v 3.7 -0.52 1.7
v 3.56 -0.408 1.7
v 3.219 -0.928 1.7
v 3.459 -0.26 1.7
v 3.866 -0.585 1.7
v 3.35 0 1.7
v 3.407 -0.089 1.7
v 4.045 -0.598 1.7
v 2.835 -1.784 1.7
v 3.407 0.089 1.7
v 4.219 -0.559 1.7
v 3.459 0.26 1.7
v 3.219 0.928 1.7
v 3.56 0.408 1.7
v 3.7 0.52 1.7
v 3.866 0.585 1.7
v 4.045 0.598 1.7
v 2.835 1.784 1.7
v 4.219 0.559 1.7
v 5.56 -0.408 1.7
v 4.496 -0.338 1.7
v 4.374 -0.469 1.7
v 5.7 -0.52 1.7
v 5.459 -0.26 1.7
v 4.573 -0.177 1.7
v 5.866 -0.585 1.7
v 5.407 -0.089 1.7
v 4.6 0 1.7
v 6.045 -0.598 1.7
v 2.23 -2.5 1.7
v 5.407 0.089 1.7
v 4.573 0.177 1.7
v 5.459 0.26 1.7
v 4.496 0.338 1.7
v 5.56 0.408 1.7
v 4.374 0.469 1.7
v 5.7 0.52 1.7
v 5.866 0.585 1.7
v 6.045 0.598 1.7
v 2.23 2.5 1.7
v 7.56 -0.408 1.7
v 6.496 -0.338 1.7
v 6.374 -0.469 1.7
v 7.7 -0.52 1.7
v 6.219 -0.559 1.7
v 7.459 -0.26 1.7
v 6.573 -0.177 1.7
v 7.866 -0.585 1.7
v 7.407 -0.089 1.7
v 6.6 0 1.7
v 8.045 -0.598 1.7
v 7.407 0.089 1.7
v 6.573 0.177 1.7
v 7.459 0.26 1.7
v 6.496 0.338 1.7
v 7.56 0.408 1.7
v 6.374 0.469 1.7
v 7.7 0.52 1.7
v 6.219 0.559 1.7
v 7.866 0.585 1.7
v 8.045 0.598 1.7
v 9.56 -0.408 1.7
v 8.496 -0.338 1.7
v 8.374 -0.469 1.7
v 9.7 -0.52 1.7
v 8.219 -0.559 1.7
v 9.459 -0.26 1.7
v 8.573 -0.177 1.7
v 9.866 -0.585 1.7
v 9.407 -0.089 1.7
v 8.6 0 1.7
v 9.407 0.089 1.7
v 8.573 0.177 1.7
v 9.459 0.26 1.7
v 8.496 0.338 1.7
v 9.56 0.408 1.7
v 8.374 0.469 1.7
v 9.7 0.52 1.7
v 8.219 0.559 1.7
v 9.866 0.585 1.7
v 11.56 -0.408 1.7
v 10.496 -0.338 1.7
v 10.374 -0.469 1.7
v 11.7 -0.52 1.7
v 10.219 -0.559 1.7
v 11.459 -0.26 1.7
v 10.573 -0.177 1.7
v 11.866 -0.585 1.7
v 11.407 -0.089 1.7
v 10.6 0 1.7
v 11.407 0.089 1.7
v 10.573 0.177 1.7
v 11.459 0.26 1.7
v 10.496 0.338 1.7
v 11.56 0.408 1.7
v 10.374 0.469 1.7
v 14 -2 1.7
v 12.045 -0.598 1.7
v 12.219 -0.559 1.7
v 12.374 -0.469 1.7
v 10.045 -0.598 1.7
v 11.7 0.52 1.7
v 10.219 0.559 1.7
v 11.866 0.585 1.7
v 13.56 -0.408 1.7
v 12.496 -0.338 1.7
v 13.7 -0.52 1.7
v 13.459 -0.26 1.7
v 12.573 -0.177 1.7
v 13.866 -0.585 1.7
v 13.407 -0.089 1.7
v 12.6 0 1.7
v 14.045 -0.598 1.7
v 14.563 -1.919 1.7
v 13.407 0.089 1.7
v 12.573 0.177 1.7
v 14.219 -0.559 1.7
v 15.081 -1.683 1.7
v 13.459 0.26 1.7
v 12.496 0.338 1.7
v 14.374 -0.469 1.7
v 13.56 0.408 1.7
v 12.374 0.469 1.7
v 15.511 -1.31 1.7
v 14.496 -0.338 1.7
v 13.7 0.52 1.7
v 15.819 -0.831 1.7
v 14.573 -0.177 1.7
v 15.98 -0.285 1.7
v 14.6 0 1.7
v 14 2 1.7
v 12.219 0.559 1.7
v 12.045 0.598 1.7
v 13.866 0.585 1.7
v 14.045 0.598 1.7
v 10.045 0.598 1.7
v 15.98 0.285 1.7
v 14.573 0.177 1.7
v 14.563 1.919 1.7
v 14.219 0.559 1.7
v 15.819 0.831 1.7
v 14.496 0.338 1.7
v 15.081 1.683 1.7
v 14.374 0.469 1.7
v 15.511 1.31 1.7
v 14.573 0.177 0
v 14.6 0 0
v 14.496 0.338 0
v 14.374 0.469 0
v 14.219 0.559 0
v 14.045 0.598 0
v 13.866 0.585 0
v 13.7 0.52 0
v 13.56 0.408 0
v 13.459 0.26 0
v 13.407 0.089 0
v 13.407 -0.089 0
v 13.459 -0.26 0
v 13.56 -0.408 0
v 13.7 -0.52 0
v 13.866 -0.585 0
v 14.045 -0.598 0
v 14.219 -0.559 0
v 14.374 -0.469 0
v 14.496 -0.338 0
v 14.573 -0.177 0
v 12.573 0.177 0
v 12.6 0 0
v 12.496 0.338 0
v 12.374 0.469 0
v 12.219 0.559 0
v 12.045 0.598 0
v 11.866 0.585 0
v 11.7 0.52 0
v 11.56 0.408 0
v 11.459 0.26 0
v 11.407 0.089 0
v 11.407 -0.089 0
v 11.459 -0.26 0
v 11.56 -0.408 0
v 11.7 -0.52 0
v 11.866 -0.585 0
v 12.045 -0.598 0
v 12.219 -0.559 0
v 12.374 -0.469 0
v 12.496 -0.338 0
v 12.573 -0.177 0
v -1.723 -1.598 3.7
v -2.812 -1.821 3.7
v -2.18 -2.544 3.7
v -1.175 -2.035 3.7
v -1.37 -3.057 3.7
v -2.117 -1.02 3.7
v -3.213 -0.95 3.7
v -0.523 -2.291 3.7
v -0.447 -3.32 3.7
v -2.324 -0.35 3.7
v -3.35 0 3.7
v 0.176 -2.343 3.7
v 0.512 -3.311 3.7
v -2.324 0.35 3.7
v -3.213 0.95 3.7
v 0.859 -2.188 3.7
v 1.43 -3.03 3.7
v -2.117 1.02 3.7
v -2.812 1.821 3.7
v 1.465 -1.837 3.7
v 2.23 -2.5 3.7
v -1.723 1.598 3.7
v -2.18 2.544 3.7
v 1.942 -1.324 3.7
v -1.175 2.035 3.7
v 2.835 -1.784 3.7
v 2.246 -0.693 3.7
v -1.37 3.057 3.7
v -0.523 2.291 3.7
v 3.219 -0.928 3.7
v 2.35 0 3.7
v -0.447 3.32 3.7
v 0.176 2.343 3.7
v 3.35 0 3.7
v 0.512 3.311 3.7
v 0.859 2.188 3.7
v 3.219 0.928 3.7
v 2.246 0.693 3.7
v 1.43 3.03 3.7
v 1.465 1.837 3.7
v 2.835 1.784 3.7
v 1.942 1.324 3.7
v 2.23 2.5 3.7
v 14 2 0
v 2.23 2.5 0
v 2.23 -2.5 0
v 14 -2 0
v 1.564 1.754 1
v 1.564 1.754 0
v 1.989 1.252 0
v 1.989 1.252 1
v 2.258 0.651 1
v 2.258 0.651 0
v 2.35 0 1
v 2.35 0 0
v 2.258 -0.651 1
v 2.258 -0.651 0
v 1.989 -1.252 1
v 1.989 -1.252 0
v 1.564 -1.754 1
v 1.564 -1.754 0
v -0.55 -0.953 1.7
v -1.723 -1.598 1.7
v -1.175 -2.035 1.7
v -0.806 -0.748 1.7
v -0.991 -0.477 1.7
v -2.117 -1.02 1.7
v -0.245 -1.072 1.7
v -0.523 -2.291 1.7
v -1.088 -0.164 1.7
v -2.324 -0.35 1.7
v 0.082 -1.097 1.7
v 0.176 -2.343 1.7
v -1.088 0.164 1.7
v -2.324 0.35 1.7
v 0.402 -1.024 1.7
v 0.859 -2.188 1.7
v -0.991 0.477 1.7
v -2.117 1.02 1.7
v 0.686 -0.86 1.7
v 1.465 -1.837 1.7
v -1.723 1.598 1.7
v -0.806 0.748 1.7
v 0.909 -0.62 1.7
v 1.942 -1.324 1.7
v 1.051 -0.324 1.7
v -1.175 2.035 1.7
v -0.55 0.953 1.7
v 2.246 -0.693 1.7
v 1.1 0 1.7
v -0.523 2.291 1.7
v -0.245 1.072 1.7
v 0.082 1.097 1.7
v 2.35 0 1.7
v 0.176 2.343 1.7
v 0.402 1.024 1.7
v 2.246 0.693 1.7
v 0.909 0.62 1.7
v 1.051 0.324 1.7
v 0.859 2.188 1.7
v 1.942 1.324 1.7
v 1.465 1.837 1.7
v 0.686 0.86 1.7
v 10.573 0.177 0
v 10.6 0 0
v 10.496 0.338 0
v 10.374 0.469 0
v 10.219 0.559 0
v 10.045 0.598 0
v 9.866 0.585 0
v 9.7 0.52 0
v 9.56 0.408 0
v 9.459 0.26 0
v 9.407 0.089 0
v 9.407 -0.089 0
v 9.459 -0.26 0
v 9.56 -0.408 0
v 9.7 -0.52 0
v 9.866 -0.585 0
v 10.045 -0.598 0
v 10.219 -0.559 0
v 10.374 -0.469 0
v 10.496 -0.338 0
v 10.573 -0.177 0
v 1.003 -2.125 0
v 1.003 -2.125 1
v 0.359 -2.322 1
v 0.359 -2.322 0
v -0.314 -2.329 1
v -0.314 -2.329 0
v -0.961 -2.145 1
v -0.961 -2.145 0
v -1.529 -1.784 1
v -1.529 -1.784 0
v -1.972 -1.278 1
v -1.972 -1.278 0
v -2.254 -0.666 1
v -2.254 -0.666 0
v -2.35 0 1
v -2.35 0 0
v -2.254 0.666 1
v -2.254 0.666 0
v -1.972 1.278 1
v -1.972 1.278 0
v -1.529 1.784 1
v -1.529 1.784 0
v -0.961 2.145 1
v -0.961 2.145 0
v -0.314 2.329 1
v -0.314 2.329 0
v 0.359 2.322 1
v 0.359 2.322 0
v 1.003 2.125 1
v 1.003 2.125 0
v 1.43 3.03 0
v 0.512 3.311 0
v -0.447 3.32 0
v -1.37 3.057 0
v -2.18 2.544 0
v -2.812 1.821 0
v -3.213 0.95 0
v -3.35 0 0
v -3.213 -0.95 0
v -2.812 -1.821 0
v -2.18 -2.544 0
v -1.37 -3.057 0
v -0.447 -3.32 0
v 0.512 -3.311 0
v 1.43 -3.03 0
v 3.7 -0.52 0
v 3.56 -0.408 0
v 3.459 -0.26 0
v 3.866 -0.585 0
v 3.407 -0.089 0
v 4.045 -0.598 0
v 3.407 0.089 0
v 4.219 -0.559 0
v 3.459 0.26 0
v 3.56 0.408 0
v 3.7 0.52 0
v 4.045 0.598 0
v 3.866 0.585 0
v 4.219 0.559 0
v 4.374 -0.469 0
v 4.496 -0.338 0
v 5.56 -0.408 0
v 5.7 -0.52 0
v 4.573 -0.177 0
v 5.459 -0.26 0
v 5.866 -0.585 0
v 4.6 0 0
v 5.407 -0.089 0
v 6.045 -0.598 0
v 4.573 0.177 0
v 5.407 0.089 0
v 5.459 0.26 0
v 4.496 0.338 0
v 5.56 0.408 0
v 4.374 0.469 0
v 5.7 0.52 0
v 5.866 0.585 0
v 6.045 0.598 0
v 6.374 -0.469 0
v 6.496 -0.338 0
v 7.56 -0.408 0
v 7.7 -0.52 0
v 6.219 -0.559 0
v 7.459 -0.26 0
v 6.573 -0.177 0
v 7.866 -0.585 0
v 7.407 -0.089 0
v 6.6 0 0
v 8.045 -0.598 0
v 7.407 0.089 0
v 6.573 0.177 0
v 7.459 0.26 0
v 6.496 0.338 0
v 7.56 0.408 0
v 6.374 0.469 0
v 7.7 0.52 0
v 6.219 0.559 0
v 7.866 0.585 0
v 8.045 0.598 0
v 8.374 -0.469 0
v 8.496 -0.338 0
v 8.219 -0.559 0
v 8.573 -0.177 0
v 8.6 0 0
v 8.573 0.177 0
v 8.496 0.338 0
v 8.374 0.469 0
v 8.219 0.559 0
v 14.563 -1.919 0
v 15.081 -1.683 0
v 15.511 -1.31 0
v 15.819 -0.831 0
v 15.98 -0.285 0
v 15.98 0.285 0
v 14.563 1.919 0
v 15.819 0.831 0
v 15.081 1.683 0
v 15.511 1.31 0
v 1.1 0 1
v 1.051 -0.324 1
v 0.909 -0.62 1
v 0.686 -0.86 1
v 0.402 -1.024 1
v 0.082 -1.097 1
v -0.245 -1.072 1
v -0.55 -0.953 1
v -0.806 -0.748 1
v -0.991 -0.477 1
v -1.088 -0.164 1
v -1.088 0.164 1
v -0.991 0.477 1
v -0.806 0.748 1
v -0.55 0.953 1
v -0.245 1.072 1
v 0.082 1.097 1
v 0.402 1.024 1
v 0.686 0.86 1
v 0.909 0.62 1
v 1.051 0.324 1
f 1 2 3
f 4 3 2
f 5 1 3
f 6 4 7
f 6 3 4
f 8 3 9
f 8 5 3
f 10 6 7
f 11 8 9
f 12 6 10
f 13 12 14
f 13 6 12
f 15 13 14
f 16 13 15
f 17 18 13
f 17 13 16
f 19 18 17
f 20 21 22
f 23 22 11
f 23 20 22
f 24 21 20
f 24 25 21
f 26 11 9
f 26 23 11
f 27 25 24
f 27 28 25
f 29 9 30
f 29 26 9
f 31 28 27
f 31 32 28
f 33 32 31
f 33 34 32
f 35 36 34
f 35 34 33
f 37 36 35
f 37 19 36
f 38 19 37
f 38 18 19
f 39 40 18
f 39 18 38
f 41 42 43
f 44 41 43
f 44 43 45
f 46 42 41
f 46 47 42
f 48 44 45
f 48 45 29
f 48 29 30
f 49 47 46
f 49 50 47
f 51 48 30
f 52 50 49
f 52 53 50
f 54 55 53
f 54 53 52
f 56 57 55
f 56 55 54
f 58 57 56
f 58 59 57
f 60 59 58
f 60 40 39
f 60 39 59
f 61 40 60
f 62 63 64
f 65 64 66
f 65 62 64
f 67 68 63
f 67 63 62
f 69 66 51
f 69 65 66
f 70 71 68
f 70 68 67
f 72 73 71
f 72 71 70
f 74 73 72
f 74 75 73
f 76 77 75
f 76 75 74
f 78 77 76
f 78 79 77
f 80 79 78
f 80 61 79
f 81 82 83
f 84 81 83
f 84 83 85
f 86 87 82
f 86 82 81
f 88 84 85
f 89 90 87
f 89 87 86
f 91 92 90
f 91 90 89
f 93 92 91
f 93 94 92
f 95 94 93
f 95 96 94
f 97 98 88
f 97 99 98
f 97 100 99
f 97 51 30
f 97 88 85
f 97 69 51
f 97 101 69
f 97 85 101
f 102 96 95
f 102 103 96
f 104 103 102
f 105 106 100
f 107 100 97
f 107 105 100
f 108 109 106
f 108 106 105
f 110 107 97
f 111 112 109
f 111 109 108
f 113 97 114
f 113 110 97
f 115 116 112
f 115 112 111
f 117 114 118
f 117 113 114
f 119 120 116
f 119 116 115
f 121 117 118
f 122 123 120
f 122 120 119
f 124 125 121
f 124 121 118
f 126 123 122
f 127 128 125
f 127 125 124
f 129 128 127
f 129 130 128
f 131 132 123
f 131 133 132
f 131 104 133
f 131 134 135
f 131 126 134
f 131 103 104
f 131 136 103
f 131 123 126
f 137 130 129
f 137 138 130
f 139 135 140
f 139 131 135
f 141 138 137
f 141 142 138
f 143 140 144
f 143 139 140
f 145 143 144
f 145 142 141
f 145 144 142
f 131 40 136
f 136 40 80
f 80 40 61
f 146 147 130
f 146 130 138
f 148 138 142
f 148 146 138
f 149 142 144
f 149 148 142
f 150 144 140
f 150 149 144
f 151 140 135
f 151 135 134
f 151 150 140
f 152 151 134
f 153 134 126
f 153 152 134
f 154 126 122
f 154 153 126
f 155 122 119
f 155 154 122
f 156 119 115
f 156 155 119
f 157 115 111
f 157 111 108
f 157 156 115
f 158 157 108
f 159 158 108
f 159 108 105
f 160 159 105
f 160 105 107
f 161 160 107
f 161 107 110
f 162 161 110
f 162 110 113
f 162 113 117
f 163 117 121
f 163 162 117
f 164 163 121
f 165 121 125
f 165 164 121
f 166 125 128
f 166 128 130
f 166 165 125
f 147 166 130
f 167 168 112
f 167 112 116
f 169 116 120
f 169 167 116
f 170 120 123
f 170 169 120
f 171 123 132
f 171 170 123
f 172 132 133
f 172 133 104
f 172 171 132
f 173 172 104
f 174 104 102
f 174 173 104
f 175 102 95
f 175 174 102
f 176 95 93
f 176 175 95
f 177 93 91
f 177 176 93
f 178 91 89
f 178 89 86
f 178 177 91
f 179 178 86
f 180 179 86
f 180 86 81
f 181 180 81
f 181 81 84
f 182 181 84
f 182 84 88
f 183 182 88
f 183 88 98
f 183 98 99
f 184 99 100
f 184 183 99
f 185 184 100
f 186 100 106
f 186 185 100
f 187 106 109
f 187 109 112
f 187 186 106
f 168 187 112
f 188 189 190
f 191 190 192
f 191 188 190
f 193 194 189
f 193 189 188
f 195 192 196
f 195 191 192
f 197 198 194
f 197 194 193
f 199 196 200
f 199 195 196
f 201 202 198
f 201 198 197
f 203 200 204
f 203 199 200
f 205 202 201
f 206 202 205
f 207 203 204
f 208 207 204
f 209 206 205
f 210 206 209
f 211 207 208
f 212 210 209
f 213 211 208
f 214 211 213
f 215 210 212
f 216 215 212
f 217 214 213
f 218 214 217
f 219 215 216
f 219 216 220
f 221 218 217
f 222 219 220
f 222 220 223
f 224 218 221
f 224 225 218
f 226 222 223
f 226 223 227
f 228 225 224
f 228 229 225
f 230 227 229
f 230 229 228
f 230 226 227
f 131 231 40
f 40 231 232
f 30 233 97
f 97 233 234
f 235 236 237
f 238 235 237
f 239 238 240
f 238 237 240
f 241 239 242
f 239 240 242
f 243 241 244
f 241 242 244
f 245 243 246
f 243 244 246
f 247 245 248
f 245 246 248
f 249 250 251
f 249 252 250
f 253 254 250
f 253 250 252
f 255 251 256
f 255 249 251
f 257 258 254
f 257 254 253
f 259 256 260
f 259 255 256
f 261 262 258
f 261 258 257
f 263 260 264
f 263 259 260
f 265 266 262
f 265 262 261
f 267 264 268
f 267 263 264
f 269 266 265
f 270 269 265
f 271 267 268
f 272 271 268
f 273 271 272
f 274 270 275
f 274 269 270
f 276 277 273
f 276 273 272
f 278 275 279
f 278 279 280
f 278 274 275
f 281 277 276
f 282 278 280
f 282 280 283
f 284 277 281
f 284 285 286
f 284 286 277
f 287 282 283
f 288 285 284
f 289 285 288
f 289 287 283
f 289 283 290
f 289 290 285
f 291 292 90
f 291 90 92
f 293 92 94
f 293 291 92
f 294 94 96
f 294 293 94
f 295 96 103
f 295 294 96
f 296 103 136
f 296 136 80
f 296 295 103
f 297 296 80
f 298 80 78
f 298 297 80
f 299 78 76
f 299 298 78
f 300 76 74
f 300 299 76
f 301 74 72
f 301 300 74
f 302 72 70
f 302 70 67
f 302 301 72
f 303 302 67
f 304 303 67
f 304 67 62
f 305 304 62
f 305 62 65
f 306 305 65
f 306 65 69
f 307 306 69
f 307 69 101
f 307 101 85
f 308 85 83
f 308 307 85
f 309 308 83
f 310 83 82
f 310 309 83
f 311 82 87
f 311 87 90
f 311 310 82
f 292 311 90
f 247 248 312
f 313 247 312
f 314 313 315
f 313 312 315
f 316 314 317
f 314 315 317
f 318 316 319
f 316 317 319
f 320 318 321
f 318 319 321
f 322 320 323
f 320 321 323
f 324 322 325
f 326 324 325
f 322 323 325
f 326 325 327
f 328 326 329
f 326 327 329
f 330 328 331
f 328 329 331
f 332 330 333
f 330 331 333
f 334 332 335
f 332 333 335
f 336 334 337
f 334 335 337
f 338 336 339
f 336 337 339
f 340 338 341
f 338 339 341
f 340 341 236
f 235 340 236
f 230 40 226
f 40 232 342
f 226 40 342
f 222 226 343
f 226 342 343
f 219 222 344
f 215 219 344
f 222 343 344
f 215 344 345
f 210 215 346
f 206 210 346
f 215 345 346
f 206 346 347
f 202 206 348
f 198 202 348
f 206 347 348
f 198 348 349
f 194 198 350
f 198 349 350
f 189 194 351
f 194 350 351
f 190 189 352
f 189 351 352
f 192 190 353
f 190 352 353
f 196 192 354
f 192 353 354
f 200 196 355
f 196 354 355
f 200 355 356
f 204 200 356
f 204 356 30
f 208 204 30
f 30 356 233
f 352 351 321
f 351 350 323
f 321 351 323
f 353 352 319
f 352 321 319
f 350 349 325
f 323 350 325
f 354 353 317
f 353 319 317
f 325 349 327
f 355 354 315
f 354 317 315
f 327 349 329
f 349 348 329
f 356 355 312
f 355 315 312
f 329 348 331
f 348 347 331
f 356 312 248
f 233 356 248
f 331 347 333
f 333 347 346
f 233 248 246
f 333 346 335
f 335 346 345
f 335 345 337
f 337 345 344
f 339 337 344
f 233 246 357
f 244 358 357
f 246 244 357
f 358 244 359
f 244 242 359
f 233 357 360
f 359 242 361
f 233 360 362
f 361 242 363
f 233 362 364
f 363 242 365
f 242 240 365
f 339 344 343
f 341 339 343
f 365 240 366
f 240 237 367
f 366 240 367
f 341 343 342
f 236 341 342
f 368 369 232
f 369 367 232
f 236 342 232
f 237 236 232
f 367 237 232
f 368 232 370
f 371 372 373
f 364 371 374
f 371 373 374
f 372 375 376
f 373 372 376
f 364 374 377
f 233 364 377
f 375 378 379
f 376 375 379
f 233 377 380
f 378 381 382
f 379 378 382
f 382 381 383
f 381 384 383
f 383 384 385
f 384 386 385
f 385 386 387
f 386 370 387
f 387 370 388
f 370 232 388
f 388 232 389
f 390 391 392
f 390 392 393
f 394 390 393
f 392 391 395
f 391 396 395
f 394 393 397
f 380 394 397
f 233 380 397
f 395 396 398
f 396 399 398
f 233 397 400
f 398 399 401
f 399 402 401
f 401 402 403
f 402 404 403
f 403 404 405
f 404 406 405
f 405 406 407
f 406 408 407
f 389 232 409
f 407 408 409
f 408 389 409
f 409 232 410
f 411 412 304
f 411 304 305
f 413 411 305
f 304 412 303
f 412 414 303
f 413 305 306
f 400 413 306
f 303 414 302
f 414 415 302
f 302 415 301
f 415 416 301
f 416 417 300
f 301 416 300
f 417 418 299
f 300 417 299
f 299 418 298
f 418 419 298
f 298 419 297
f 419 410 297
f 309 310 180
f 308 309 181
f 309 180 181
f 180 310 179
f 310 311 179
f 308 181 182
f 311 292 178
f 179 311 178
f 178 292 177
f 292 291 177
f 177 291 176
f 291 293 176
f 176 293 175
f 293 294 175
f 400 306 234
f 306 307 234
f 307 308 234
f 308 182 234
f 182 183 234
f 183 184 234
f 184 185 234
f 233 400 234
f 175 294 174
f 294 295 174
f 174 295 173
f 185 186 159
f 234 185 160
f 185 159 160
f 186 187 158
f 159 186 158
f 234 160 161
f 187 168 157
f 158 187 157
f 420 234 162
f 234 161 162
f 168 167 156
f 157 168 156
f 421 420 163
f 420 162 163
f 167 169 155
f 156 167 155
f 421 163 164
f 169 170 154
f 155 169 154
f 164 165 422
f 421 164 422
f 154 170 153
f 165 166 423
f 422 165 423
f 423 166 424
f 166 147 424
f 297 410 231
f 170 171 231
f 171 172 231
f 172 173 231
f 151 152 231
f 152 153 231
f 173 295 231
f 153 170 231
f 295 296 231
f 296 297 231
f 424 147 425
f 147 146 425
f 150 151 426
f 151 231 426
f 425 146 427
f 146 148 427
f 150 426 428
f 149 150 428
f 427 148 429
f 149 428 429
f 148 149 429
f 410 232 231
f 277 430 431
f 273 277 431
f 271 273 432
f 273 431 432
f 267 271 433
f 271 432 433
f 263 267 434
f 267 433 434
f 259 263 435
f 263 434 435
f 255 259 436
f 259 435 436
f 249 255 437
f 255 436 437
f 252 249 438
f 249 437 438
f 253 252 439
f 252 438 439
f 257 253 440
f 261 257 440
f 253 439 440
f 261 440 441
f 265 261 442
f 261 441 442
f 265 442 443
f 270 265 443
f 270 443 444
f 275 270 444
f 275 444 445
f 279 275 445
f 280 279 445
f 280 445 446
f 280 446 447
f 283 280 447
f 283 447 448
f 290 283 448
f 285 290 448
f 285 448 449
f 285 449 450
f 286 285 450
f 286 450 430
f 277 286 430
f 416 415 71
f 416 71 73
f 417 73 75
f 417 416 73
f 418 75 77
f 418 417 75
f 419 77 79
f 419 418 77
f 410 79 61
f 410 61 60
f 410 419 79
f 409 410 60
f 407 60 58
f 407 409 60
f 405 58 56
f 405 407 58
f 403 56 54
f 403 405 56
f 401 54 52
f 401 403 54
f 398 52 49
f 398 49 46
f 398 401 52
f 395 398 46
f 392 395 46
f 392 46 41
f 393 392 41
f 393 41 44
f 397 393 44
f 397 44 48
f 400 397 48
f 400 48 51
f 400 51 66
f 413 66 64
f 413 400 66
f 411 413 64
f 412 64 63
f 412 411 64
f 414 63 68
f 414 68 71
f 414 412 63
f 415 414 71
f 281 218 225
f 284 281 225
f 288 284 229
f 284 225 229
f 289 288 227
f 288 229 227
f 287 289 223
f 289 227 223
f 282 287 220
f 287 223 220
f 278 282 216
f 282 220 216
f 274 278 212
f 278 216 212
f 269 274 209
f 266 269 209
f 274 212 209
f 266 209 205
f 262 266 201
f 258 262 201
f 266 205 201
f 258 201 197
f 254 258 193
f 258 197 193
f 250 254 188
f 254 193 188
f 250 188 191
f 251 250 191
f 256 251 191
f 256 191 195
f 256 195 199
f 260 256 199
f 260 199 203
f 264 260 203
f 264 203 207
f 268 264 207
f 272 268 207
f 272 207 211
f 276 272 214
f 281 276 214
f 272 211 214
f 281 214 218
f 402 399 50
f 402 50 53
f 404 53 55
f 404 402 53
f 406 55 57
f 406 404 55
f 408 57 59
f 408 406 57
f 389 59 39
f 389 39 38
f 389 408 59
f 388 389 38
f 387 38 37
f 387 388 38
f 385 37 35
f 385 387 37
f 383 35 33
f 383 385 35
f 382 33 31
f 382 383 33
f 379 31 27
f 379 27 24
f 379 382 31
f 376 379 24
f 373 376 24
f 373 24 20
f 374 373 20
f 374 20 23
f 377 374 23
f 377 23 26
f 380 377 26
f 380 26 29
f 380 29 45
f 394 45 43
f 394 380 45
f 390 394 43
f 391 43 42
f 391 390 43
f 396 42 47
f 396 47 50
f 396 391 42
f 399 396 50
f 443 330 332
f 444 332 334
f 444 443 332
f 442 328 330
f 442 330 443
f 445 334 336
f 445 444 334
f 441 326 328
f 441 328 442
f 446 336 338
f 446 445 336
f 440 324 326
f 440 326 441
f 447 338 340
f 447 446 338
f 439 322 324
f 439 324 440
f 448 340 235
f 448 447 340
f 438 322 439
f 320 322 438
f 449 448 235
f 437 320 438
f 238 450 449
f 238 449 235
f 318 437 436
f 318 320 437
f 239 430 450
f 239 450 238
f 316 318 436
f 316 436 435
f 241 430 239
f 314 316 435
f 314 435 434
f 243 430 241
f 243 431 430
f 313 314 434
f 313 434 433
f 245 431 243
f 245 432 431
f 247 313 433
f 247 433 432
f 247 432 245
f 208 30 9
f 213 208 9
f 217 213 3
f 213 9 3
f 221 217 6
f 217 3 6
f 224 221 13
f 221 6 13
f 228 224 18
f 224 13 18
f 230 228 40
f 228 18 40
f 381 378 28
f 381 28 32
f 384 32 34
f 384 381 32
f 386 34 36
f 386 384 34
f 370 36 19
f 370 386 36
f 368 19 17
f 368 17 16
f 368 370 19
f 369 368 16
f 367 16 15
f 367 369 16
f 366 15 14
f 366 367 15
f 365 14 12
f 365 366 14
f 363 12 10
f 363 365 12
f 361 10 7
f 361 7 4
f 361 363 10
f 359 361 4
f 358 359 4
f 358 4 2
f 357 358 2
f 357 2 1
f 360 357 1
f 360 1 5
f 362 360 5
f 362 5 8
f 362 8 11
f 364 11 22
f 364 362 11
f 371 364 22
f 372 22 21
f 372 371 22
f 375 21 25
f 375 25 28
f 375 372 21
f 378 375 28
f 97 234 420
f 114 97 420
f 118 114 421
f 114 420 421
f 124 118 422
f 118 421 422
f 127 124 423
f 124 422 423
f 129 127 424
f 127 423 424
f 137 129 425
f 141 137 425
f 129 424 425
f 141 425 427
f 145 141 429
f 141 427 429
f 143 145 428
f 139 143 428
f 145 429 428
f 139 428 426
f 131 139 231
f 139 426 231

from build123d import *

# Parameters (mm, degrees)
F0_R     = 0.6
F1_DEPTH = 1.7
F3_DEPTH = 2
F5_DEPTH = 1
F6_R     = 1.1
F7_DEPTH = 2.701
F8_R     = 2.35
F9_DEPTH = 2


with BuildPart() as f1:
    # F0 (on Top) → F1 (new body)
    with BuildSketch(Plane.XY):
        with BuildLine():
            ThreePointArc((2.2299103121, -2.5), (3.057180036, -1.369726333), (3.35, 0))
            ThreePointArc((3.35, 0), (3.057180036, 1.369726333), (2.2299103121, 2.5))
            ThreePointArc((2.2299103121, 2.5), (-3.35, 0), (2.2299103121, -2.5))
        make_face()
        with BuildLine():
            ThreePointArc((2.2299103121, 2.5), (3.057180036, 1.369726333), (3.35, 0))
            ThreePointArc((3.35, 0), (3.057180036, -1.369726333), (2.2299103121, -2.5))
            Line((2.2299103121, -2.5), (14, -2))
            ThreePointArc((14, -2), (16, 0), (14, 2))
            Line((14, 2), (2.2299103121, 2.5))
        make_face()
        with Locations((4, 0)):
            Circle(F0_R, mode=Mode.SUBTRACT)
        with Locations((6, 0)):
            Circle(F0_R, mode=Mode.SUBTRACT)
        with Locations((8, 0)):
            Circle(F0_R, mode=Mode.SUBTRACT)
        with Locations((10, 0)):
            Circle(F0_R, mode=Mode.SUBTRACT)
        with Locations((12, 0)):
            Circle(F0_R, mode=Mode.SUBTRACT)
        with Locations((14, 0)):
            Circle(F0_R, mode=Mode.SUBTRACT)
    extrude(amount=F1_DEPTH)

    # F2 (on face) → F3 (join)
    with BuildSketch(Plane.XY.offset(1.7)):
        with BuildLine():
            ThreePointArc((2.2299103121, -2.5), (3.35, 0), (2.2299103121, 2.5))
            ThreePointArc((2.2299103121, 2.5), (-3.35, 0), (2.2299103121, -2.5))
        make_face()
    extrude(amount=F3_DEPTH)

    # F4 (on face) → F5 (cut)
    with BuildSketch(Plane(origin=(0, 0, 0), x_dir=(1, 0, 0), z_dir=(0, 0, -1))):
        with BuildLine():
            ThreePointArc((1.5642654428, 1.7537313433), (-2.35, 0), (1.5642654428, -1.7537313433))
            ThreePointArc((1.5642654428, -1.7537313433), (2.35, 0), (1.5642654428, 1.7537313433))
        make_face()
    extrude(amount=-F5_DEPTH, mode=Mode.SUBTRACT)

    # F6 (on face) → F7 (cut, through all)
    with BuildSketch(Plane(origin=(0, 0, 1), x_dir=(1, 0, 0), z_dir=(0, 0, -1))):
        Circle(F6_R)
    extrude(amount=-F7_DEPTH, mode=Mode.SUBTRACT)

    # F8 (on face) → F9 (cut, through all)
    with BuildSketch(Plane.XY.offset(3.7)):
        Circle(F8_R)
    extrude(amount=-F9_DEPTH, mode=Mode.SUBTRACT)


solid = f1.part
